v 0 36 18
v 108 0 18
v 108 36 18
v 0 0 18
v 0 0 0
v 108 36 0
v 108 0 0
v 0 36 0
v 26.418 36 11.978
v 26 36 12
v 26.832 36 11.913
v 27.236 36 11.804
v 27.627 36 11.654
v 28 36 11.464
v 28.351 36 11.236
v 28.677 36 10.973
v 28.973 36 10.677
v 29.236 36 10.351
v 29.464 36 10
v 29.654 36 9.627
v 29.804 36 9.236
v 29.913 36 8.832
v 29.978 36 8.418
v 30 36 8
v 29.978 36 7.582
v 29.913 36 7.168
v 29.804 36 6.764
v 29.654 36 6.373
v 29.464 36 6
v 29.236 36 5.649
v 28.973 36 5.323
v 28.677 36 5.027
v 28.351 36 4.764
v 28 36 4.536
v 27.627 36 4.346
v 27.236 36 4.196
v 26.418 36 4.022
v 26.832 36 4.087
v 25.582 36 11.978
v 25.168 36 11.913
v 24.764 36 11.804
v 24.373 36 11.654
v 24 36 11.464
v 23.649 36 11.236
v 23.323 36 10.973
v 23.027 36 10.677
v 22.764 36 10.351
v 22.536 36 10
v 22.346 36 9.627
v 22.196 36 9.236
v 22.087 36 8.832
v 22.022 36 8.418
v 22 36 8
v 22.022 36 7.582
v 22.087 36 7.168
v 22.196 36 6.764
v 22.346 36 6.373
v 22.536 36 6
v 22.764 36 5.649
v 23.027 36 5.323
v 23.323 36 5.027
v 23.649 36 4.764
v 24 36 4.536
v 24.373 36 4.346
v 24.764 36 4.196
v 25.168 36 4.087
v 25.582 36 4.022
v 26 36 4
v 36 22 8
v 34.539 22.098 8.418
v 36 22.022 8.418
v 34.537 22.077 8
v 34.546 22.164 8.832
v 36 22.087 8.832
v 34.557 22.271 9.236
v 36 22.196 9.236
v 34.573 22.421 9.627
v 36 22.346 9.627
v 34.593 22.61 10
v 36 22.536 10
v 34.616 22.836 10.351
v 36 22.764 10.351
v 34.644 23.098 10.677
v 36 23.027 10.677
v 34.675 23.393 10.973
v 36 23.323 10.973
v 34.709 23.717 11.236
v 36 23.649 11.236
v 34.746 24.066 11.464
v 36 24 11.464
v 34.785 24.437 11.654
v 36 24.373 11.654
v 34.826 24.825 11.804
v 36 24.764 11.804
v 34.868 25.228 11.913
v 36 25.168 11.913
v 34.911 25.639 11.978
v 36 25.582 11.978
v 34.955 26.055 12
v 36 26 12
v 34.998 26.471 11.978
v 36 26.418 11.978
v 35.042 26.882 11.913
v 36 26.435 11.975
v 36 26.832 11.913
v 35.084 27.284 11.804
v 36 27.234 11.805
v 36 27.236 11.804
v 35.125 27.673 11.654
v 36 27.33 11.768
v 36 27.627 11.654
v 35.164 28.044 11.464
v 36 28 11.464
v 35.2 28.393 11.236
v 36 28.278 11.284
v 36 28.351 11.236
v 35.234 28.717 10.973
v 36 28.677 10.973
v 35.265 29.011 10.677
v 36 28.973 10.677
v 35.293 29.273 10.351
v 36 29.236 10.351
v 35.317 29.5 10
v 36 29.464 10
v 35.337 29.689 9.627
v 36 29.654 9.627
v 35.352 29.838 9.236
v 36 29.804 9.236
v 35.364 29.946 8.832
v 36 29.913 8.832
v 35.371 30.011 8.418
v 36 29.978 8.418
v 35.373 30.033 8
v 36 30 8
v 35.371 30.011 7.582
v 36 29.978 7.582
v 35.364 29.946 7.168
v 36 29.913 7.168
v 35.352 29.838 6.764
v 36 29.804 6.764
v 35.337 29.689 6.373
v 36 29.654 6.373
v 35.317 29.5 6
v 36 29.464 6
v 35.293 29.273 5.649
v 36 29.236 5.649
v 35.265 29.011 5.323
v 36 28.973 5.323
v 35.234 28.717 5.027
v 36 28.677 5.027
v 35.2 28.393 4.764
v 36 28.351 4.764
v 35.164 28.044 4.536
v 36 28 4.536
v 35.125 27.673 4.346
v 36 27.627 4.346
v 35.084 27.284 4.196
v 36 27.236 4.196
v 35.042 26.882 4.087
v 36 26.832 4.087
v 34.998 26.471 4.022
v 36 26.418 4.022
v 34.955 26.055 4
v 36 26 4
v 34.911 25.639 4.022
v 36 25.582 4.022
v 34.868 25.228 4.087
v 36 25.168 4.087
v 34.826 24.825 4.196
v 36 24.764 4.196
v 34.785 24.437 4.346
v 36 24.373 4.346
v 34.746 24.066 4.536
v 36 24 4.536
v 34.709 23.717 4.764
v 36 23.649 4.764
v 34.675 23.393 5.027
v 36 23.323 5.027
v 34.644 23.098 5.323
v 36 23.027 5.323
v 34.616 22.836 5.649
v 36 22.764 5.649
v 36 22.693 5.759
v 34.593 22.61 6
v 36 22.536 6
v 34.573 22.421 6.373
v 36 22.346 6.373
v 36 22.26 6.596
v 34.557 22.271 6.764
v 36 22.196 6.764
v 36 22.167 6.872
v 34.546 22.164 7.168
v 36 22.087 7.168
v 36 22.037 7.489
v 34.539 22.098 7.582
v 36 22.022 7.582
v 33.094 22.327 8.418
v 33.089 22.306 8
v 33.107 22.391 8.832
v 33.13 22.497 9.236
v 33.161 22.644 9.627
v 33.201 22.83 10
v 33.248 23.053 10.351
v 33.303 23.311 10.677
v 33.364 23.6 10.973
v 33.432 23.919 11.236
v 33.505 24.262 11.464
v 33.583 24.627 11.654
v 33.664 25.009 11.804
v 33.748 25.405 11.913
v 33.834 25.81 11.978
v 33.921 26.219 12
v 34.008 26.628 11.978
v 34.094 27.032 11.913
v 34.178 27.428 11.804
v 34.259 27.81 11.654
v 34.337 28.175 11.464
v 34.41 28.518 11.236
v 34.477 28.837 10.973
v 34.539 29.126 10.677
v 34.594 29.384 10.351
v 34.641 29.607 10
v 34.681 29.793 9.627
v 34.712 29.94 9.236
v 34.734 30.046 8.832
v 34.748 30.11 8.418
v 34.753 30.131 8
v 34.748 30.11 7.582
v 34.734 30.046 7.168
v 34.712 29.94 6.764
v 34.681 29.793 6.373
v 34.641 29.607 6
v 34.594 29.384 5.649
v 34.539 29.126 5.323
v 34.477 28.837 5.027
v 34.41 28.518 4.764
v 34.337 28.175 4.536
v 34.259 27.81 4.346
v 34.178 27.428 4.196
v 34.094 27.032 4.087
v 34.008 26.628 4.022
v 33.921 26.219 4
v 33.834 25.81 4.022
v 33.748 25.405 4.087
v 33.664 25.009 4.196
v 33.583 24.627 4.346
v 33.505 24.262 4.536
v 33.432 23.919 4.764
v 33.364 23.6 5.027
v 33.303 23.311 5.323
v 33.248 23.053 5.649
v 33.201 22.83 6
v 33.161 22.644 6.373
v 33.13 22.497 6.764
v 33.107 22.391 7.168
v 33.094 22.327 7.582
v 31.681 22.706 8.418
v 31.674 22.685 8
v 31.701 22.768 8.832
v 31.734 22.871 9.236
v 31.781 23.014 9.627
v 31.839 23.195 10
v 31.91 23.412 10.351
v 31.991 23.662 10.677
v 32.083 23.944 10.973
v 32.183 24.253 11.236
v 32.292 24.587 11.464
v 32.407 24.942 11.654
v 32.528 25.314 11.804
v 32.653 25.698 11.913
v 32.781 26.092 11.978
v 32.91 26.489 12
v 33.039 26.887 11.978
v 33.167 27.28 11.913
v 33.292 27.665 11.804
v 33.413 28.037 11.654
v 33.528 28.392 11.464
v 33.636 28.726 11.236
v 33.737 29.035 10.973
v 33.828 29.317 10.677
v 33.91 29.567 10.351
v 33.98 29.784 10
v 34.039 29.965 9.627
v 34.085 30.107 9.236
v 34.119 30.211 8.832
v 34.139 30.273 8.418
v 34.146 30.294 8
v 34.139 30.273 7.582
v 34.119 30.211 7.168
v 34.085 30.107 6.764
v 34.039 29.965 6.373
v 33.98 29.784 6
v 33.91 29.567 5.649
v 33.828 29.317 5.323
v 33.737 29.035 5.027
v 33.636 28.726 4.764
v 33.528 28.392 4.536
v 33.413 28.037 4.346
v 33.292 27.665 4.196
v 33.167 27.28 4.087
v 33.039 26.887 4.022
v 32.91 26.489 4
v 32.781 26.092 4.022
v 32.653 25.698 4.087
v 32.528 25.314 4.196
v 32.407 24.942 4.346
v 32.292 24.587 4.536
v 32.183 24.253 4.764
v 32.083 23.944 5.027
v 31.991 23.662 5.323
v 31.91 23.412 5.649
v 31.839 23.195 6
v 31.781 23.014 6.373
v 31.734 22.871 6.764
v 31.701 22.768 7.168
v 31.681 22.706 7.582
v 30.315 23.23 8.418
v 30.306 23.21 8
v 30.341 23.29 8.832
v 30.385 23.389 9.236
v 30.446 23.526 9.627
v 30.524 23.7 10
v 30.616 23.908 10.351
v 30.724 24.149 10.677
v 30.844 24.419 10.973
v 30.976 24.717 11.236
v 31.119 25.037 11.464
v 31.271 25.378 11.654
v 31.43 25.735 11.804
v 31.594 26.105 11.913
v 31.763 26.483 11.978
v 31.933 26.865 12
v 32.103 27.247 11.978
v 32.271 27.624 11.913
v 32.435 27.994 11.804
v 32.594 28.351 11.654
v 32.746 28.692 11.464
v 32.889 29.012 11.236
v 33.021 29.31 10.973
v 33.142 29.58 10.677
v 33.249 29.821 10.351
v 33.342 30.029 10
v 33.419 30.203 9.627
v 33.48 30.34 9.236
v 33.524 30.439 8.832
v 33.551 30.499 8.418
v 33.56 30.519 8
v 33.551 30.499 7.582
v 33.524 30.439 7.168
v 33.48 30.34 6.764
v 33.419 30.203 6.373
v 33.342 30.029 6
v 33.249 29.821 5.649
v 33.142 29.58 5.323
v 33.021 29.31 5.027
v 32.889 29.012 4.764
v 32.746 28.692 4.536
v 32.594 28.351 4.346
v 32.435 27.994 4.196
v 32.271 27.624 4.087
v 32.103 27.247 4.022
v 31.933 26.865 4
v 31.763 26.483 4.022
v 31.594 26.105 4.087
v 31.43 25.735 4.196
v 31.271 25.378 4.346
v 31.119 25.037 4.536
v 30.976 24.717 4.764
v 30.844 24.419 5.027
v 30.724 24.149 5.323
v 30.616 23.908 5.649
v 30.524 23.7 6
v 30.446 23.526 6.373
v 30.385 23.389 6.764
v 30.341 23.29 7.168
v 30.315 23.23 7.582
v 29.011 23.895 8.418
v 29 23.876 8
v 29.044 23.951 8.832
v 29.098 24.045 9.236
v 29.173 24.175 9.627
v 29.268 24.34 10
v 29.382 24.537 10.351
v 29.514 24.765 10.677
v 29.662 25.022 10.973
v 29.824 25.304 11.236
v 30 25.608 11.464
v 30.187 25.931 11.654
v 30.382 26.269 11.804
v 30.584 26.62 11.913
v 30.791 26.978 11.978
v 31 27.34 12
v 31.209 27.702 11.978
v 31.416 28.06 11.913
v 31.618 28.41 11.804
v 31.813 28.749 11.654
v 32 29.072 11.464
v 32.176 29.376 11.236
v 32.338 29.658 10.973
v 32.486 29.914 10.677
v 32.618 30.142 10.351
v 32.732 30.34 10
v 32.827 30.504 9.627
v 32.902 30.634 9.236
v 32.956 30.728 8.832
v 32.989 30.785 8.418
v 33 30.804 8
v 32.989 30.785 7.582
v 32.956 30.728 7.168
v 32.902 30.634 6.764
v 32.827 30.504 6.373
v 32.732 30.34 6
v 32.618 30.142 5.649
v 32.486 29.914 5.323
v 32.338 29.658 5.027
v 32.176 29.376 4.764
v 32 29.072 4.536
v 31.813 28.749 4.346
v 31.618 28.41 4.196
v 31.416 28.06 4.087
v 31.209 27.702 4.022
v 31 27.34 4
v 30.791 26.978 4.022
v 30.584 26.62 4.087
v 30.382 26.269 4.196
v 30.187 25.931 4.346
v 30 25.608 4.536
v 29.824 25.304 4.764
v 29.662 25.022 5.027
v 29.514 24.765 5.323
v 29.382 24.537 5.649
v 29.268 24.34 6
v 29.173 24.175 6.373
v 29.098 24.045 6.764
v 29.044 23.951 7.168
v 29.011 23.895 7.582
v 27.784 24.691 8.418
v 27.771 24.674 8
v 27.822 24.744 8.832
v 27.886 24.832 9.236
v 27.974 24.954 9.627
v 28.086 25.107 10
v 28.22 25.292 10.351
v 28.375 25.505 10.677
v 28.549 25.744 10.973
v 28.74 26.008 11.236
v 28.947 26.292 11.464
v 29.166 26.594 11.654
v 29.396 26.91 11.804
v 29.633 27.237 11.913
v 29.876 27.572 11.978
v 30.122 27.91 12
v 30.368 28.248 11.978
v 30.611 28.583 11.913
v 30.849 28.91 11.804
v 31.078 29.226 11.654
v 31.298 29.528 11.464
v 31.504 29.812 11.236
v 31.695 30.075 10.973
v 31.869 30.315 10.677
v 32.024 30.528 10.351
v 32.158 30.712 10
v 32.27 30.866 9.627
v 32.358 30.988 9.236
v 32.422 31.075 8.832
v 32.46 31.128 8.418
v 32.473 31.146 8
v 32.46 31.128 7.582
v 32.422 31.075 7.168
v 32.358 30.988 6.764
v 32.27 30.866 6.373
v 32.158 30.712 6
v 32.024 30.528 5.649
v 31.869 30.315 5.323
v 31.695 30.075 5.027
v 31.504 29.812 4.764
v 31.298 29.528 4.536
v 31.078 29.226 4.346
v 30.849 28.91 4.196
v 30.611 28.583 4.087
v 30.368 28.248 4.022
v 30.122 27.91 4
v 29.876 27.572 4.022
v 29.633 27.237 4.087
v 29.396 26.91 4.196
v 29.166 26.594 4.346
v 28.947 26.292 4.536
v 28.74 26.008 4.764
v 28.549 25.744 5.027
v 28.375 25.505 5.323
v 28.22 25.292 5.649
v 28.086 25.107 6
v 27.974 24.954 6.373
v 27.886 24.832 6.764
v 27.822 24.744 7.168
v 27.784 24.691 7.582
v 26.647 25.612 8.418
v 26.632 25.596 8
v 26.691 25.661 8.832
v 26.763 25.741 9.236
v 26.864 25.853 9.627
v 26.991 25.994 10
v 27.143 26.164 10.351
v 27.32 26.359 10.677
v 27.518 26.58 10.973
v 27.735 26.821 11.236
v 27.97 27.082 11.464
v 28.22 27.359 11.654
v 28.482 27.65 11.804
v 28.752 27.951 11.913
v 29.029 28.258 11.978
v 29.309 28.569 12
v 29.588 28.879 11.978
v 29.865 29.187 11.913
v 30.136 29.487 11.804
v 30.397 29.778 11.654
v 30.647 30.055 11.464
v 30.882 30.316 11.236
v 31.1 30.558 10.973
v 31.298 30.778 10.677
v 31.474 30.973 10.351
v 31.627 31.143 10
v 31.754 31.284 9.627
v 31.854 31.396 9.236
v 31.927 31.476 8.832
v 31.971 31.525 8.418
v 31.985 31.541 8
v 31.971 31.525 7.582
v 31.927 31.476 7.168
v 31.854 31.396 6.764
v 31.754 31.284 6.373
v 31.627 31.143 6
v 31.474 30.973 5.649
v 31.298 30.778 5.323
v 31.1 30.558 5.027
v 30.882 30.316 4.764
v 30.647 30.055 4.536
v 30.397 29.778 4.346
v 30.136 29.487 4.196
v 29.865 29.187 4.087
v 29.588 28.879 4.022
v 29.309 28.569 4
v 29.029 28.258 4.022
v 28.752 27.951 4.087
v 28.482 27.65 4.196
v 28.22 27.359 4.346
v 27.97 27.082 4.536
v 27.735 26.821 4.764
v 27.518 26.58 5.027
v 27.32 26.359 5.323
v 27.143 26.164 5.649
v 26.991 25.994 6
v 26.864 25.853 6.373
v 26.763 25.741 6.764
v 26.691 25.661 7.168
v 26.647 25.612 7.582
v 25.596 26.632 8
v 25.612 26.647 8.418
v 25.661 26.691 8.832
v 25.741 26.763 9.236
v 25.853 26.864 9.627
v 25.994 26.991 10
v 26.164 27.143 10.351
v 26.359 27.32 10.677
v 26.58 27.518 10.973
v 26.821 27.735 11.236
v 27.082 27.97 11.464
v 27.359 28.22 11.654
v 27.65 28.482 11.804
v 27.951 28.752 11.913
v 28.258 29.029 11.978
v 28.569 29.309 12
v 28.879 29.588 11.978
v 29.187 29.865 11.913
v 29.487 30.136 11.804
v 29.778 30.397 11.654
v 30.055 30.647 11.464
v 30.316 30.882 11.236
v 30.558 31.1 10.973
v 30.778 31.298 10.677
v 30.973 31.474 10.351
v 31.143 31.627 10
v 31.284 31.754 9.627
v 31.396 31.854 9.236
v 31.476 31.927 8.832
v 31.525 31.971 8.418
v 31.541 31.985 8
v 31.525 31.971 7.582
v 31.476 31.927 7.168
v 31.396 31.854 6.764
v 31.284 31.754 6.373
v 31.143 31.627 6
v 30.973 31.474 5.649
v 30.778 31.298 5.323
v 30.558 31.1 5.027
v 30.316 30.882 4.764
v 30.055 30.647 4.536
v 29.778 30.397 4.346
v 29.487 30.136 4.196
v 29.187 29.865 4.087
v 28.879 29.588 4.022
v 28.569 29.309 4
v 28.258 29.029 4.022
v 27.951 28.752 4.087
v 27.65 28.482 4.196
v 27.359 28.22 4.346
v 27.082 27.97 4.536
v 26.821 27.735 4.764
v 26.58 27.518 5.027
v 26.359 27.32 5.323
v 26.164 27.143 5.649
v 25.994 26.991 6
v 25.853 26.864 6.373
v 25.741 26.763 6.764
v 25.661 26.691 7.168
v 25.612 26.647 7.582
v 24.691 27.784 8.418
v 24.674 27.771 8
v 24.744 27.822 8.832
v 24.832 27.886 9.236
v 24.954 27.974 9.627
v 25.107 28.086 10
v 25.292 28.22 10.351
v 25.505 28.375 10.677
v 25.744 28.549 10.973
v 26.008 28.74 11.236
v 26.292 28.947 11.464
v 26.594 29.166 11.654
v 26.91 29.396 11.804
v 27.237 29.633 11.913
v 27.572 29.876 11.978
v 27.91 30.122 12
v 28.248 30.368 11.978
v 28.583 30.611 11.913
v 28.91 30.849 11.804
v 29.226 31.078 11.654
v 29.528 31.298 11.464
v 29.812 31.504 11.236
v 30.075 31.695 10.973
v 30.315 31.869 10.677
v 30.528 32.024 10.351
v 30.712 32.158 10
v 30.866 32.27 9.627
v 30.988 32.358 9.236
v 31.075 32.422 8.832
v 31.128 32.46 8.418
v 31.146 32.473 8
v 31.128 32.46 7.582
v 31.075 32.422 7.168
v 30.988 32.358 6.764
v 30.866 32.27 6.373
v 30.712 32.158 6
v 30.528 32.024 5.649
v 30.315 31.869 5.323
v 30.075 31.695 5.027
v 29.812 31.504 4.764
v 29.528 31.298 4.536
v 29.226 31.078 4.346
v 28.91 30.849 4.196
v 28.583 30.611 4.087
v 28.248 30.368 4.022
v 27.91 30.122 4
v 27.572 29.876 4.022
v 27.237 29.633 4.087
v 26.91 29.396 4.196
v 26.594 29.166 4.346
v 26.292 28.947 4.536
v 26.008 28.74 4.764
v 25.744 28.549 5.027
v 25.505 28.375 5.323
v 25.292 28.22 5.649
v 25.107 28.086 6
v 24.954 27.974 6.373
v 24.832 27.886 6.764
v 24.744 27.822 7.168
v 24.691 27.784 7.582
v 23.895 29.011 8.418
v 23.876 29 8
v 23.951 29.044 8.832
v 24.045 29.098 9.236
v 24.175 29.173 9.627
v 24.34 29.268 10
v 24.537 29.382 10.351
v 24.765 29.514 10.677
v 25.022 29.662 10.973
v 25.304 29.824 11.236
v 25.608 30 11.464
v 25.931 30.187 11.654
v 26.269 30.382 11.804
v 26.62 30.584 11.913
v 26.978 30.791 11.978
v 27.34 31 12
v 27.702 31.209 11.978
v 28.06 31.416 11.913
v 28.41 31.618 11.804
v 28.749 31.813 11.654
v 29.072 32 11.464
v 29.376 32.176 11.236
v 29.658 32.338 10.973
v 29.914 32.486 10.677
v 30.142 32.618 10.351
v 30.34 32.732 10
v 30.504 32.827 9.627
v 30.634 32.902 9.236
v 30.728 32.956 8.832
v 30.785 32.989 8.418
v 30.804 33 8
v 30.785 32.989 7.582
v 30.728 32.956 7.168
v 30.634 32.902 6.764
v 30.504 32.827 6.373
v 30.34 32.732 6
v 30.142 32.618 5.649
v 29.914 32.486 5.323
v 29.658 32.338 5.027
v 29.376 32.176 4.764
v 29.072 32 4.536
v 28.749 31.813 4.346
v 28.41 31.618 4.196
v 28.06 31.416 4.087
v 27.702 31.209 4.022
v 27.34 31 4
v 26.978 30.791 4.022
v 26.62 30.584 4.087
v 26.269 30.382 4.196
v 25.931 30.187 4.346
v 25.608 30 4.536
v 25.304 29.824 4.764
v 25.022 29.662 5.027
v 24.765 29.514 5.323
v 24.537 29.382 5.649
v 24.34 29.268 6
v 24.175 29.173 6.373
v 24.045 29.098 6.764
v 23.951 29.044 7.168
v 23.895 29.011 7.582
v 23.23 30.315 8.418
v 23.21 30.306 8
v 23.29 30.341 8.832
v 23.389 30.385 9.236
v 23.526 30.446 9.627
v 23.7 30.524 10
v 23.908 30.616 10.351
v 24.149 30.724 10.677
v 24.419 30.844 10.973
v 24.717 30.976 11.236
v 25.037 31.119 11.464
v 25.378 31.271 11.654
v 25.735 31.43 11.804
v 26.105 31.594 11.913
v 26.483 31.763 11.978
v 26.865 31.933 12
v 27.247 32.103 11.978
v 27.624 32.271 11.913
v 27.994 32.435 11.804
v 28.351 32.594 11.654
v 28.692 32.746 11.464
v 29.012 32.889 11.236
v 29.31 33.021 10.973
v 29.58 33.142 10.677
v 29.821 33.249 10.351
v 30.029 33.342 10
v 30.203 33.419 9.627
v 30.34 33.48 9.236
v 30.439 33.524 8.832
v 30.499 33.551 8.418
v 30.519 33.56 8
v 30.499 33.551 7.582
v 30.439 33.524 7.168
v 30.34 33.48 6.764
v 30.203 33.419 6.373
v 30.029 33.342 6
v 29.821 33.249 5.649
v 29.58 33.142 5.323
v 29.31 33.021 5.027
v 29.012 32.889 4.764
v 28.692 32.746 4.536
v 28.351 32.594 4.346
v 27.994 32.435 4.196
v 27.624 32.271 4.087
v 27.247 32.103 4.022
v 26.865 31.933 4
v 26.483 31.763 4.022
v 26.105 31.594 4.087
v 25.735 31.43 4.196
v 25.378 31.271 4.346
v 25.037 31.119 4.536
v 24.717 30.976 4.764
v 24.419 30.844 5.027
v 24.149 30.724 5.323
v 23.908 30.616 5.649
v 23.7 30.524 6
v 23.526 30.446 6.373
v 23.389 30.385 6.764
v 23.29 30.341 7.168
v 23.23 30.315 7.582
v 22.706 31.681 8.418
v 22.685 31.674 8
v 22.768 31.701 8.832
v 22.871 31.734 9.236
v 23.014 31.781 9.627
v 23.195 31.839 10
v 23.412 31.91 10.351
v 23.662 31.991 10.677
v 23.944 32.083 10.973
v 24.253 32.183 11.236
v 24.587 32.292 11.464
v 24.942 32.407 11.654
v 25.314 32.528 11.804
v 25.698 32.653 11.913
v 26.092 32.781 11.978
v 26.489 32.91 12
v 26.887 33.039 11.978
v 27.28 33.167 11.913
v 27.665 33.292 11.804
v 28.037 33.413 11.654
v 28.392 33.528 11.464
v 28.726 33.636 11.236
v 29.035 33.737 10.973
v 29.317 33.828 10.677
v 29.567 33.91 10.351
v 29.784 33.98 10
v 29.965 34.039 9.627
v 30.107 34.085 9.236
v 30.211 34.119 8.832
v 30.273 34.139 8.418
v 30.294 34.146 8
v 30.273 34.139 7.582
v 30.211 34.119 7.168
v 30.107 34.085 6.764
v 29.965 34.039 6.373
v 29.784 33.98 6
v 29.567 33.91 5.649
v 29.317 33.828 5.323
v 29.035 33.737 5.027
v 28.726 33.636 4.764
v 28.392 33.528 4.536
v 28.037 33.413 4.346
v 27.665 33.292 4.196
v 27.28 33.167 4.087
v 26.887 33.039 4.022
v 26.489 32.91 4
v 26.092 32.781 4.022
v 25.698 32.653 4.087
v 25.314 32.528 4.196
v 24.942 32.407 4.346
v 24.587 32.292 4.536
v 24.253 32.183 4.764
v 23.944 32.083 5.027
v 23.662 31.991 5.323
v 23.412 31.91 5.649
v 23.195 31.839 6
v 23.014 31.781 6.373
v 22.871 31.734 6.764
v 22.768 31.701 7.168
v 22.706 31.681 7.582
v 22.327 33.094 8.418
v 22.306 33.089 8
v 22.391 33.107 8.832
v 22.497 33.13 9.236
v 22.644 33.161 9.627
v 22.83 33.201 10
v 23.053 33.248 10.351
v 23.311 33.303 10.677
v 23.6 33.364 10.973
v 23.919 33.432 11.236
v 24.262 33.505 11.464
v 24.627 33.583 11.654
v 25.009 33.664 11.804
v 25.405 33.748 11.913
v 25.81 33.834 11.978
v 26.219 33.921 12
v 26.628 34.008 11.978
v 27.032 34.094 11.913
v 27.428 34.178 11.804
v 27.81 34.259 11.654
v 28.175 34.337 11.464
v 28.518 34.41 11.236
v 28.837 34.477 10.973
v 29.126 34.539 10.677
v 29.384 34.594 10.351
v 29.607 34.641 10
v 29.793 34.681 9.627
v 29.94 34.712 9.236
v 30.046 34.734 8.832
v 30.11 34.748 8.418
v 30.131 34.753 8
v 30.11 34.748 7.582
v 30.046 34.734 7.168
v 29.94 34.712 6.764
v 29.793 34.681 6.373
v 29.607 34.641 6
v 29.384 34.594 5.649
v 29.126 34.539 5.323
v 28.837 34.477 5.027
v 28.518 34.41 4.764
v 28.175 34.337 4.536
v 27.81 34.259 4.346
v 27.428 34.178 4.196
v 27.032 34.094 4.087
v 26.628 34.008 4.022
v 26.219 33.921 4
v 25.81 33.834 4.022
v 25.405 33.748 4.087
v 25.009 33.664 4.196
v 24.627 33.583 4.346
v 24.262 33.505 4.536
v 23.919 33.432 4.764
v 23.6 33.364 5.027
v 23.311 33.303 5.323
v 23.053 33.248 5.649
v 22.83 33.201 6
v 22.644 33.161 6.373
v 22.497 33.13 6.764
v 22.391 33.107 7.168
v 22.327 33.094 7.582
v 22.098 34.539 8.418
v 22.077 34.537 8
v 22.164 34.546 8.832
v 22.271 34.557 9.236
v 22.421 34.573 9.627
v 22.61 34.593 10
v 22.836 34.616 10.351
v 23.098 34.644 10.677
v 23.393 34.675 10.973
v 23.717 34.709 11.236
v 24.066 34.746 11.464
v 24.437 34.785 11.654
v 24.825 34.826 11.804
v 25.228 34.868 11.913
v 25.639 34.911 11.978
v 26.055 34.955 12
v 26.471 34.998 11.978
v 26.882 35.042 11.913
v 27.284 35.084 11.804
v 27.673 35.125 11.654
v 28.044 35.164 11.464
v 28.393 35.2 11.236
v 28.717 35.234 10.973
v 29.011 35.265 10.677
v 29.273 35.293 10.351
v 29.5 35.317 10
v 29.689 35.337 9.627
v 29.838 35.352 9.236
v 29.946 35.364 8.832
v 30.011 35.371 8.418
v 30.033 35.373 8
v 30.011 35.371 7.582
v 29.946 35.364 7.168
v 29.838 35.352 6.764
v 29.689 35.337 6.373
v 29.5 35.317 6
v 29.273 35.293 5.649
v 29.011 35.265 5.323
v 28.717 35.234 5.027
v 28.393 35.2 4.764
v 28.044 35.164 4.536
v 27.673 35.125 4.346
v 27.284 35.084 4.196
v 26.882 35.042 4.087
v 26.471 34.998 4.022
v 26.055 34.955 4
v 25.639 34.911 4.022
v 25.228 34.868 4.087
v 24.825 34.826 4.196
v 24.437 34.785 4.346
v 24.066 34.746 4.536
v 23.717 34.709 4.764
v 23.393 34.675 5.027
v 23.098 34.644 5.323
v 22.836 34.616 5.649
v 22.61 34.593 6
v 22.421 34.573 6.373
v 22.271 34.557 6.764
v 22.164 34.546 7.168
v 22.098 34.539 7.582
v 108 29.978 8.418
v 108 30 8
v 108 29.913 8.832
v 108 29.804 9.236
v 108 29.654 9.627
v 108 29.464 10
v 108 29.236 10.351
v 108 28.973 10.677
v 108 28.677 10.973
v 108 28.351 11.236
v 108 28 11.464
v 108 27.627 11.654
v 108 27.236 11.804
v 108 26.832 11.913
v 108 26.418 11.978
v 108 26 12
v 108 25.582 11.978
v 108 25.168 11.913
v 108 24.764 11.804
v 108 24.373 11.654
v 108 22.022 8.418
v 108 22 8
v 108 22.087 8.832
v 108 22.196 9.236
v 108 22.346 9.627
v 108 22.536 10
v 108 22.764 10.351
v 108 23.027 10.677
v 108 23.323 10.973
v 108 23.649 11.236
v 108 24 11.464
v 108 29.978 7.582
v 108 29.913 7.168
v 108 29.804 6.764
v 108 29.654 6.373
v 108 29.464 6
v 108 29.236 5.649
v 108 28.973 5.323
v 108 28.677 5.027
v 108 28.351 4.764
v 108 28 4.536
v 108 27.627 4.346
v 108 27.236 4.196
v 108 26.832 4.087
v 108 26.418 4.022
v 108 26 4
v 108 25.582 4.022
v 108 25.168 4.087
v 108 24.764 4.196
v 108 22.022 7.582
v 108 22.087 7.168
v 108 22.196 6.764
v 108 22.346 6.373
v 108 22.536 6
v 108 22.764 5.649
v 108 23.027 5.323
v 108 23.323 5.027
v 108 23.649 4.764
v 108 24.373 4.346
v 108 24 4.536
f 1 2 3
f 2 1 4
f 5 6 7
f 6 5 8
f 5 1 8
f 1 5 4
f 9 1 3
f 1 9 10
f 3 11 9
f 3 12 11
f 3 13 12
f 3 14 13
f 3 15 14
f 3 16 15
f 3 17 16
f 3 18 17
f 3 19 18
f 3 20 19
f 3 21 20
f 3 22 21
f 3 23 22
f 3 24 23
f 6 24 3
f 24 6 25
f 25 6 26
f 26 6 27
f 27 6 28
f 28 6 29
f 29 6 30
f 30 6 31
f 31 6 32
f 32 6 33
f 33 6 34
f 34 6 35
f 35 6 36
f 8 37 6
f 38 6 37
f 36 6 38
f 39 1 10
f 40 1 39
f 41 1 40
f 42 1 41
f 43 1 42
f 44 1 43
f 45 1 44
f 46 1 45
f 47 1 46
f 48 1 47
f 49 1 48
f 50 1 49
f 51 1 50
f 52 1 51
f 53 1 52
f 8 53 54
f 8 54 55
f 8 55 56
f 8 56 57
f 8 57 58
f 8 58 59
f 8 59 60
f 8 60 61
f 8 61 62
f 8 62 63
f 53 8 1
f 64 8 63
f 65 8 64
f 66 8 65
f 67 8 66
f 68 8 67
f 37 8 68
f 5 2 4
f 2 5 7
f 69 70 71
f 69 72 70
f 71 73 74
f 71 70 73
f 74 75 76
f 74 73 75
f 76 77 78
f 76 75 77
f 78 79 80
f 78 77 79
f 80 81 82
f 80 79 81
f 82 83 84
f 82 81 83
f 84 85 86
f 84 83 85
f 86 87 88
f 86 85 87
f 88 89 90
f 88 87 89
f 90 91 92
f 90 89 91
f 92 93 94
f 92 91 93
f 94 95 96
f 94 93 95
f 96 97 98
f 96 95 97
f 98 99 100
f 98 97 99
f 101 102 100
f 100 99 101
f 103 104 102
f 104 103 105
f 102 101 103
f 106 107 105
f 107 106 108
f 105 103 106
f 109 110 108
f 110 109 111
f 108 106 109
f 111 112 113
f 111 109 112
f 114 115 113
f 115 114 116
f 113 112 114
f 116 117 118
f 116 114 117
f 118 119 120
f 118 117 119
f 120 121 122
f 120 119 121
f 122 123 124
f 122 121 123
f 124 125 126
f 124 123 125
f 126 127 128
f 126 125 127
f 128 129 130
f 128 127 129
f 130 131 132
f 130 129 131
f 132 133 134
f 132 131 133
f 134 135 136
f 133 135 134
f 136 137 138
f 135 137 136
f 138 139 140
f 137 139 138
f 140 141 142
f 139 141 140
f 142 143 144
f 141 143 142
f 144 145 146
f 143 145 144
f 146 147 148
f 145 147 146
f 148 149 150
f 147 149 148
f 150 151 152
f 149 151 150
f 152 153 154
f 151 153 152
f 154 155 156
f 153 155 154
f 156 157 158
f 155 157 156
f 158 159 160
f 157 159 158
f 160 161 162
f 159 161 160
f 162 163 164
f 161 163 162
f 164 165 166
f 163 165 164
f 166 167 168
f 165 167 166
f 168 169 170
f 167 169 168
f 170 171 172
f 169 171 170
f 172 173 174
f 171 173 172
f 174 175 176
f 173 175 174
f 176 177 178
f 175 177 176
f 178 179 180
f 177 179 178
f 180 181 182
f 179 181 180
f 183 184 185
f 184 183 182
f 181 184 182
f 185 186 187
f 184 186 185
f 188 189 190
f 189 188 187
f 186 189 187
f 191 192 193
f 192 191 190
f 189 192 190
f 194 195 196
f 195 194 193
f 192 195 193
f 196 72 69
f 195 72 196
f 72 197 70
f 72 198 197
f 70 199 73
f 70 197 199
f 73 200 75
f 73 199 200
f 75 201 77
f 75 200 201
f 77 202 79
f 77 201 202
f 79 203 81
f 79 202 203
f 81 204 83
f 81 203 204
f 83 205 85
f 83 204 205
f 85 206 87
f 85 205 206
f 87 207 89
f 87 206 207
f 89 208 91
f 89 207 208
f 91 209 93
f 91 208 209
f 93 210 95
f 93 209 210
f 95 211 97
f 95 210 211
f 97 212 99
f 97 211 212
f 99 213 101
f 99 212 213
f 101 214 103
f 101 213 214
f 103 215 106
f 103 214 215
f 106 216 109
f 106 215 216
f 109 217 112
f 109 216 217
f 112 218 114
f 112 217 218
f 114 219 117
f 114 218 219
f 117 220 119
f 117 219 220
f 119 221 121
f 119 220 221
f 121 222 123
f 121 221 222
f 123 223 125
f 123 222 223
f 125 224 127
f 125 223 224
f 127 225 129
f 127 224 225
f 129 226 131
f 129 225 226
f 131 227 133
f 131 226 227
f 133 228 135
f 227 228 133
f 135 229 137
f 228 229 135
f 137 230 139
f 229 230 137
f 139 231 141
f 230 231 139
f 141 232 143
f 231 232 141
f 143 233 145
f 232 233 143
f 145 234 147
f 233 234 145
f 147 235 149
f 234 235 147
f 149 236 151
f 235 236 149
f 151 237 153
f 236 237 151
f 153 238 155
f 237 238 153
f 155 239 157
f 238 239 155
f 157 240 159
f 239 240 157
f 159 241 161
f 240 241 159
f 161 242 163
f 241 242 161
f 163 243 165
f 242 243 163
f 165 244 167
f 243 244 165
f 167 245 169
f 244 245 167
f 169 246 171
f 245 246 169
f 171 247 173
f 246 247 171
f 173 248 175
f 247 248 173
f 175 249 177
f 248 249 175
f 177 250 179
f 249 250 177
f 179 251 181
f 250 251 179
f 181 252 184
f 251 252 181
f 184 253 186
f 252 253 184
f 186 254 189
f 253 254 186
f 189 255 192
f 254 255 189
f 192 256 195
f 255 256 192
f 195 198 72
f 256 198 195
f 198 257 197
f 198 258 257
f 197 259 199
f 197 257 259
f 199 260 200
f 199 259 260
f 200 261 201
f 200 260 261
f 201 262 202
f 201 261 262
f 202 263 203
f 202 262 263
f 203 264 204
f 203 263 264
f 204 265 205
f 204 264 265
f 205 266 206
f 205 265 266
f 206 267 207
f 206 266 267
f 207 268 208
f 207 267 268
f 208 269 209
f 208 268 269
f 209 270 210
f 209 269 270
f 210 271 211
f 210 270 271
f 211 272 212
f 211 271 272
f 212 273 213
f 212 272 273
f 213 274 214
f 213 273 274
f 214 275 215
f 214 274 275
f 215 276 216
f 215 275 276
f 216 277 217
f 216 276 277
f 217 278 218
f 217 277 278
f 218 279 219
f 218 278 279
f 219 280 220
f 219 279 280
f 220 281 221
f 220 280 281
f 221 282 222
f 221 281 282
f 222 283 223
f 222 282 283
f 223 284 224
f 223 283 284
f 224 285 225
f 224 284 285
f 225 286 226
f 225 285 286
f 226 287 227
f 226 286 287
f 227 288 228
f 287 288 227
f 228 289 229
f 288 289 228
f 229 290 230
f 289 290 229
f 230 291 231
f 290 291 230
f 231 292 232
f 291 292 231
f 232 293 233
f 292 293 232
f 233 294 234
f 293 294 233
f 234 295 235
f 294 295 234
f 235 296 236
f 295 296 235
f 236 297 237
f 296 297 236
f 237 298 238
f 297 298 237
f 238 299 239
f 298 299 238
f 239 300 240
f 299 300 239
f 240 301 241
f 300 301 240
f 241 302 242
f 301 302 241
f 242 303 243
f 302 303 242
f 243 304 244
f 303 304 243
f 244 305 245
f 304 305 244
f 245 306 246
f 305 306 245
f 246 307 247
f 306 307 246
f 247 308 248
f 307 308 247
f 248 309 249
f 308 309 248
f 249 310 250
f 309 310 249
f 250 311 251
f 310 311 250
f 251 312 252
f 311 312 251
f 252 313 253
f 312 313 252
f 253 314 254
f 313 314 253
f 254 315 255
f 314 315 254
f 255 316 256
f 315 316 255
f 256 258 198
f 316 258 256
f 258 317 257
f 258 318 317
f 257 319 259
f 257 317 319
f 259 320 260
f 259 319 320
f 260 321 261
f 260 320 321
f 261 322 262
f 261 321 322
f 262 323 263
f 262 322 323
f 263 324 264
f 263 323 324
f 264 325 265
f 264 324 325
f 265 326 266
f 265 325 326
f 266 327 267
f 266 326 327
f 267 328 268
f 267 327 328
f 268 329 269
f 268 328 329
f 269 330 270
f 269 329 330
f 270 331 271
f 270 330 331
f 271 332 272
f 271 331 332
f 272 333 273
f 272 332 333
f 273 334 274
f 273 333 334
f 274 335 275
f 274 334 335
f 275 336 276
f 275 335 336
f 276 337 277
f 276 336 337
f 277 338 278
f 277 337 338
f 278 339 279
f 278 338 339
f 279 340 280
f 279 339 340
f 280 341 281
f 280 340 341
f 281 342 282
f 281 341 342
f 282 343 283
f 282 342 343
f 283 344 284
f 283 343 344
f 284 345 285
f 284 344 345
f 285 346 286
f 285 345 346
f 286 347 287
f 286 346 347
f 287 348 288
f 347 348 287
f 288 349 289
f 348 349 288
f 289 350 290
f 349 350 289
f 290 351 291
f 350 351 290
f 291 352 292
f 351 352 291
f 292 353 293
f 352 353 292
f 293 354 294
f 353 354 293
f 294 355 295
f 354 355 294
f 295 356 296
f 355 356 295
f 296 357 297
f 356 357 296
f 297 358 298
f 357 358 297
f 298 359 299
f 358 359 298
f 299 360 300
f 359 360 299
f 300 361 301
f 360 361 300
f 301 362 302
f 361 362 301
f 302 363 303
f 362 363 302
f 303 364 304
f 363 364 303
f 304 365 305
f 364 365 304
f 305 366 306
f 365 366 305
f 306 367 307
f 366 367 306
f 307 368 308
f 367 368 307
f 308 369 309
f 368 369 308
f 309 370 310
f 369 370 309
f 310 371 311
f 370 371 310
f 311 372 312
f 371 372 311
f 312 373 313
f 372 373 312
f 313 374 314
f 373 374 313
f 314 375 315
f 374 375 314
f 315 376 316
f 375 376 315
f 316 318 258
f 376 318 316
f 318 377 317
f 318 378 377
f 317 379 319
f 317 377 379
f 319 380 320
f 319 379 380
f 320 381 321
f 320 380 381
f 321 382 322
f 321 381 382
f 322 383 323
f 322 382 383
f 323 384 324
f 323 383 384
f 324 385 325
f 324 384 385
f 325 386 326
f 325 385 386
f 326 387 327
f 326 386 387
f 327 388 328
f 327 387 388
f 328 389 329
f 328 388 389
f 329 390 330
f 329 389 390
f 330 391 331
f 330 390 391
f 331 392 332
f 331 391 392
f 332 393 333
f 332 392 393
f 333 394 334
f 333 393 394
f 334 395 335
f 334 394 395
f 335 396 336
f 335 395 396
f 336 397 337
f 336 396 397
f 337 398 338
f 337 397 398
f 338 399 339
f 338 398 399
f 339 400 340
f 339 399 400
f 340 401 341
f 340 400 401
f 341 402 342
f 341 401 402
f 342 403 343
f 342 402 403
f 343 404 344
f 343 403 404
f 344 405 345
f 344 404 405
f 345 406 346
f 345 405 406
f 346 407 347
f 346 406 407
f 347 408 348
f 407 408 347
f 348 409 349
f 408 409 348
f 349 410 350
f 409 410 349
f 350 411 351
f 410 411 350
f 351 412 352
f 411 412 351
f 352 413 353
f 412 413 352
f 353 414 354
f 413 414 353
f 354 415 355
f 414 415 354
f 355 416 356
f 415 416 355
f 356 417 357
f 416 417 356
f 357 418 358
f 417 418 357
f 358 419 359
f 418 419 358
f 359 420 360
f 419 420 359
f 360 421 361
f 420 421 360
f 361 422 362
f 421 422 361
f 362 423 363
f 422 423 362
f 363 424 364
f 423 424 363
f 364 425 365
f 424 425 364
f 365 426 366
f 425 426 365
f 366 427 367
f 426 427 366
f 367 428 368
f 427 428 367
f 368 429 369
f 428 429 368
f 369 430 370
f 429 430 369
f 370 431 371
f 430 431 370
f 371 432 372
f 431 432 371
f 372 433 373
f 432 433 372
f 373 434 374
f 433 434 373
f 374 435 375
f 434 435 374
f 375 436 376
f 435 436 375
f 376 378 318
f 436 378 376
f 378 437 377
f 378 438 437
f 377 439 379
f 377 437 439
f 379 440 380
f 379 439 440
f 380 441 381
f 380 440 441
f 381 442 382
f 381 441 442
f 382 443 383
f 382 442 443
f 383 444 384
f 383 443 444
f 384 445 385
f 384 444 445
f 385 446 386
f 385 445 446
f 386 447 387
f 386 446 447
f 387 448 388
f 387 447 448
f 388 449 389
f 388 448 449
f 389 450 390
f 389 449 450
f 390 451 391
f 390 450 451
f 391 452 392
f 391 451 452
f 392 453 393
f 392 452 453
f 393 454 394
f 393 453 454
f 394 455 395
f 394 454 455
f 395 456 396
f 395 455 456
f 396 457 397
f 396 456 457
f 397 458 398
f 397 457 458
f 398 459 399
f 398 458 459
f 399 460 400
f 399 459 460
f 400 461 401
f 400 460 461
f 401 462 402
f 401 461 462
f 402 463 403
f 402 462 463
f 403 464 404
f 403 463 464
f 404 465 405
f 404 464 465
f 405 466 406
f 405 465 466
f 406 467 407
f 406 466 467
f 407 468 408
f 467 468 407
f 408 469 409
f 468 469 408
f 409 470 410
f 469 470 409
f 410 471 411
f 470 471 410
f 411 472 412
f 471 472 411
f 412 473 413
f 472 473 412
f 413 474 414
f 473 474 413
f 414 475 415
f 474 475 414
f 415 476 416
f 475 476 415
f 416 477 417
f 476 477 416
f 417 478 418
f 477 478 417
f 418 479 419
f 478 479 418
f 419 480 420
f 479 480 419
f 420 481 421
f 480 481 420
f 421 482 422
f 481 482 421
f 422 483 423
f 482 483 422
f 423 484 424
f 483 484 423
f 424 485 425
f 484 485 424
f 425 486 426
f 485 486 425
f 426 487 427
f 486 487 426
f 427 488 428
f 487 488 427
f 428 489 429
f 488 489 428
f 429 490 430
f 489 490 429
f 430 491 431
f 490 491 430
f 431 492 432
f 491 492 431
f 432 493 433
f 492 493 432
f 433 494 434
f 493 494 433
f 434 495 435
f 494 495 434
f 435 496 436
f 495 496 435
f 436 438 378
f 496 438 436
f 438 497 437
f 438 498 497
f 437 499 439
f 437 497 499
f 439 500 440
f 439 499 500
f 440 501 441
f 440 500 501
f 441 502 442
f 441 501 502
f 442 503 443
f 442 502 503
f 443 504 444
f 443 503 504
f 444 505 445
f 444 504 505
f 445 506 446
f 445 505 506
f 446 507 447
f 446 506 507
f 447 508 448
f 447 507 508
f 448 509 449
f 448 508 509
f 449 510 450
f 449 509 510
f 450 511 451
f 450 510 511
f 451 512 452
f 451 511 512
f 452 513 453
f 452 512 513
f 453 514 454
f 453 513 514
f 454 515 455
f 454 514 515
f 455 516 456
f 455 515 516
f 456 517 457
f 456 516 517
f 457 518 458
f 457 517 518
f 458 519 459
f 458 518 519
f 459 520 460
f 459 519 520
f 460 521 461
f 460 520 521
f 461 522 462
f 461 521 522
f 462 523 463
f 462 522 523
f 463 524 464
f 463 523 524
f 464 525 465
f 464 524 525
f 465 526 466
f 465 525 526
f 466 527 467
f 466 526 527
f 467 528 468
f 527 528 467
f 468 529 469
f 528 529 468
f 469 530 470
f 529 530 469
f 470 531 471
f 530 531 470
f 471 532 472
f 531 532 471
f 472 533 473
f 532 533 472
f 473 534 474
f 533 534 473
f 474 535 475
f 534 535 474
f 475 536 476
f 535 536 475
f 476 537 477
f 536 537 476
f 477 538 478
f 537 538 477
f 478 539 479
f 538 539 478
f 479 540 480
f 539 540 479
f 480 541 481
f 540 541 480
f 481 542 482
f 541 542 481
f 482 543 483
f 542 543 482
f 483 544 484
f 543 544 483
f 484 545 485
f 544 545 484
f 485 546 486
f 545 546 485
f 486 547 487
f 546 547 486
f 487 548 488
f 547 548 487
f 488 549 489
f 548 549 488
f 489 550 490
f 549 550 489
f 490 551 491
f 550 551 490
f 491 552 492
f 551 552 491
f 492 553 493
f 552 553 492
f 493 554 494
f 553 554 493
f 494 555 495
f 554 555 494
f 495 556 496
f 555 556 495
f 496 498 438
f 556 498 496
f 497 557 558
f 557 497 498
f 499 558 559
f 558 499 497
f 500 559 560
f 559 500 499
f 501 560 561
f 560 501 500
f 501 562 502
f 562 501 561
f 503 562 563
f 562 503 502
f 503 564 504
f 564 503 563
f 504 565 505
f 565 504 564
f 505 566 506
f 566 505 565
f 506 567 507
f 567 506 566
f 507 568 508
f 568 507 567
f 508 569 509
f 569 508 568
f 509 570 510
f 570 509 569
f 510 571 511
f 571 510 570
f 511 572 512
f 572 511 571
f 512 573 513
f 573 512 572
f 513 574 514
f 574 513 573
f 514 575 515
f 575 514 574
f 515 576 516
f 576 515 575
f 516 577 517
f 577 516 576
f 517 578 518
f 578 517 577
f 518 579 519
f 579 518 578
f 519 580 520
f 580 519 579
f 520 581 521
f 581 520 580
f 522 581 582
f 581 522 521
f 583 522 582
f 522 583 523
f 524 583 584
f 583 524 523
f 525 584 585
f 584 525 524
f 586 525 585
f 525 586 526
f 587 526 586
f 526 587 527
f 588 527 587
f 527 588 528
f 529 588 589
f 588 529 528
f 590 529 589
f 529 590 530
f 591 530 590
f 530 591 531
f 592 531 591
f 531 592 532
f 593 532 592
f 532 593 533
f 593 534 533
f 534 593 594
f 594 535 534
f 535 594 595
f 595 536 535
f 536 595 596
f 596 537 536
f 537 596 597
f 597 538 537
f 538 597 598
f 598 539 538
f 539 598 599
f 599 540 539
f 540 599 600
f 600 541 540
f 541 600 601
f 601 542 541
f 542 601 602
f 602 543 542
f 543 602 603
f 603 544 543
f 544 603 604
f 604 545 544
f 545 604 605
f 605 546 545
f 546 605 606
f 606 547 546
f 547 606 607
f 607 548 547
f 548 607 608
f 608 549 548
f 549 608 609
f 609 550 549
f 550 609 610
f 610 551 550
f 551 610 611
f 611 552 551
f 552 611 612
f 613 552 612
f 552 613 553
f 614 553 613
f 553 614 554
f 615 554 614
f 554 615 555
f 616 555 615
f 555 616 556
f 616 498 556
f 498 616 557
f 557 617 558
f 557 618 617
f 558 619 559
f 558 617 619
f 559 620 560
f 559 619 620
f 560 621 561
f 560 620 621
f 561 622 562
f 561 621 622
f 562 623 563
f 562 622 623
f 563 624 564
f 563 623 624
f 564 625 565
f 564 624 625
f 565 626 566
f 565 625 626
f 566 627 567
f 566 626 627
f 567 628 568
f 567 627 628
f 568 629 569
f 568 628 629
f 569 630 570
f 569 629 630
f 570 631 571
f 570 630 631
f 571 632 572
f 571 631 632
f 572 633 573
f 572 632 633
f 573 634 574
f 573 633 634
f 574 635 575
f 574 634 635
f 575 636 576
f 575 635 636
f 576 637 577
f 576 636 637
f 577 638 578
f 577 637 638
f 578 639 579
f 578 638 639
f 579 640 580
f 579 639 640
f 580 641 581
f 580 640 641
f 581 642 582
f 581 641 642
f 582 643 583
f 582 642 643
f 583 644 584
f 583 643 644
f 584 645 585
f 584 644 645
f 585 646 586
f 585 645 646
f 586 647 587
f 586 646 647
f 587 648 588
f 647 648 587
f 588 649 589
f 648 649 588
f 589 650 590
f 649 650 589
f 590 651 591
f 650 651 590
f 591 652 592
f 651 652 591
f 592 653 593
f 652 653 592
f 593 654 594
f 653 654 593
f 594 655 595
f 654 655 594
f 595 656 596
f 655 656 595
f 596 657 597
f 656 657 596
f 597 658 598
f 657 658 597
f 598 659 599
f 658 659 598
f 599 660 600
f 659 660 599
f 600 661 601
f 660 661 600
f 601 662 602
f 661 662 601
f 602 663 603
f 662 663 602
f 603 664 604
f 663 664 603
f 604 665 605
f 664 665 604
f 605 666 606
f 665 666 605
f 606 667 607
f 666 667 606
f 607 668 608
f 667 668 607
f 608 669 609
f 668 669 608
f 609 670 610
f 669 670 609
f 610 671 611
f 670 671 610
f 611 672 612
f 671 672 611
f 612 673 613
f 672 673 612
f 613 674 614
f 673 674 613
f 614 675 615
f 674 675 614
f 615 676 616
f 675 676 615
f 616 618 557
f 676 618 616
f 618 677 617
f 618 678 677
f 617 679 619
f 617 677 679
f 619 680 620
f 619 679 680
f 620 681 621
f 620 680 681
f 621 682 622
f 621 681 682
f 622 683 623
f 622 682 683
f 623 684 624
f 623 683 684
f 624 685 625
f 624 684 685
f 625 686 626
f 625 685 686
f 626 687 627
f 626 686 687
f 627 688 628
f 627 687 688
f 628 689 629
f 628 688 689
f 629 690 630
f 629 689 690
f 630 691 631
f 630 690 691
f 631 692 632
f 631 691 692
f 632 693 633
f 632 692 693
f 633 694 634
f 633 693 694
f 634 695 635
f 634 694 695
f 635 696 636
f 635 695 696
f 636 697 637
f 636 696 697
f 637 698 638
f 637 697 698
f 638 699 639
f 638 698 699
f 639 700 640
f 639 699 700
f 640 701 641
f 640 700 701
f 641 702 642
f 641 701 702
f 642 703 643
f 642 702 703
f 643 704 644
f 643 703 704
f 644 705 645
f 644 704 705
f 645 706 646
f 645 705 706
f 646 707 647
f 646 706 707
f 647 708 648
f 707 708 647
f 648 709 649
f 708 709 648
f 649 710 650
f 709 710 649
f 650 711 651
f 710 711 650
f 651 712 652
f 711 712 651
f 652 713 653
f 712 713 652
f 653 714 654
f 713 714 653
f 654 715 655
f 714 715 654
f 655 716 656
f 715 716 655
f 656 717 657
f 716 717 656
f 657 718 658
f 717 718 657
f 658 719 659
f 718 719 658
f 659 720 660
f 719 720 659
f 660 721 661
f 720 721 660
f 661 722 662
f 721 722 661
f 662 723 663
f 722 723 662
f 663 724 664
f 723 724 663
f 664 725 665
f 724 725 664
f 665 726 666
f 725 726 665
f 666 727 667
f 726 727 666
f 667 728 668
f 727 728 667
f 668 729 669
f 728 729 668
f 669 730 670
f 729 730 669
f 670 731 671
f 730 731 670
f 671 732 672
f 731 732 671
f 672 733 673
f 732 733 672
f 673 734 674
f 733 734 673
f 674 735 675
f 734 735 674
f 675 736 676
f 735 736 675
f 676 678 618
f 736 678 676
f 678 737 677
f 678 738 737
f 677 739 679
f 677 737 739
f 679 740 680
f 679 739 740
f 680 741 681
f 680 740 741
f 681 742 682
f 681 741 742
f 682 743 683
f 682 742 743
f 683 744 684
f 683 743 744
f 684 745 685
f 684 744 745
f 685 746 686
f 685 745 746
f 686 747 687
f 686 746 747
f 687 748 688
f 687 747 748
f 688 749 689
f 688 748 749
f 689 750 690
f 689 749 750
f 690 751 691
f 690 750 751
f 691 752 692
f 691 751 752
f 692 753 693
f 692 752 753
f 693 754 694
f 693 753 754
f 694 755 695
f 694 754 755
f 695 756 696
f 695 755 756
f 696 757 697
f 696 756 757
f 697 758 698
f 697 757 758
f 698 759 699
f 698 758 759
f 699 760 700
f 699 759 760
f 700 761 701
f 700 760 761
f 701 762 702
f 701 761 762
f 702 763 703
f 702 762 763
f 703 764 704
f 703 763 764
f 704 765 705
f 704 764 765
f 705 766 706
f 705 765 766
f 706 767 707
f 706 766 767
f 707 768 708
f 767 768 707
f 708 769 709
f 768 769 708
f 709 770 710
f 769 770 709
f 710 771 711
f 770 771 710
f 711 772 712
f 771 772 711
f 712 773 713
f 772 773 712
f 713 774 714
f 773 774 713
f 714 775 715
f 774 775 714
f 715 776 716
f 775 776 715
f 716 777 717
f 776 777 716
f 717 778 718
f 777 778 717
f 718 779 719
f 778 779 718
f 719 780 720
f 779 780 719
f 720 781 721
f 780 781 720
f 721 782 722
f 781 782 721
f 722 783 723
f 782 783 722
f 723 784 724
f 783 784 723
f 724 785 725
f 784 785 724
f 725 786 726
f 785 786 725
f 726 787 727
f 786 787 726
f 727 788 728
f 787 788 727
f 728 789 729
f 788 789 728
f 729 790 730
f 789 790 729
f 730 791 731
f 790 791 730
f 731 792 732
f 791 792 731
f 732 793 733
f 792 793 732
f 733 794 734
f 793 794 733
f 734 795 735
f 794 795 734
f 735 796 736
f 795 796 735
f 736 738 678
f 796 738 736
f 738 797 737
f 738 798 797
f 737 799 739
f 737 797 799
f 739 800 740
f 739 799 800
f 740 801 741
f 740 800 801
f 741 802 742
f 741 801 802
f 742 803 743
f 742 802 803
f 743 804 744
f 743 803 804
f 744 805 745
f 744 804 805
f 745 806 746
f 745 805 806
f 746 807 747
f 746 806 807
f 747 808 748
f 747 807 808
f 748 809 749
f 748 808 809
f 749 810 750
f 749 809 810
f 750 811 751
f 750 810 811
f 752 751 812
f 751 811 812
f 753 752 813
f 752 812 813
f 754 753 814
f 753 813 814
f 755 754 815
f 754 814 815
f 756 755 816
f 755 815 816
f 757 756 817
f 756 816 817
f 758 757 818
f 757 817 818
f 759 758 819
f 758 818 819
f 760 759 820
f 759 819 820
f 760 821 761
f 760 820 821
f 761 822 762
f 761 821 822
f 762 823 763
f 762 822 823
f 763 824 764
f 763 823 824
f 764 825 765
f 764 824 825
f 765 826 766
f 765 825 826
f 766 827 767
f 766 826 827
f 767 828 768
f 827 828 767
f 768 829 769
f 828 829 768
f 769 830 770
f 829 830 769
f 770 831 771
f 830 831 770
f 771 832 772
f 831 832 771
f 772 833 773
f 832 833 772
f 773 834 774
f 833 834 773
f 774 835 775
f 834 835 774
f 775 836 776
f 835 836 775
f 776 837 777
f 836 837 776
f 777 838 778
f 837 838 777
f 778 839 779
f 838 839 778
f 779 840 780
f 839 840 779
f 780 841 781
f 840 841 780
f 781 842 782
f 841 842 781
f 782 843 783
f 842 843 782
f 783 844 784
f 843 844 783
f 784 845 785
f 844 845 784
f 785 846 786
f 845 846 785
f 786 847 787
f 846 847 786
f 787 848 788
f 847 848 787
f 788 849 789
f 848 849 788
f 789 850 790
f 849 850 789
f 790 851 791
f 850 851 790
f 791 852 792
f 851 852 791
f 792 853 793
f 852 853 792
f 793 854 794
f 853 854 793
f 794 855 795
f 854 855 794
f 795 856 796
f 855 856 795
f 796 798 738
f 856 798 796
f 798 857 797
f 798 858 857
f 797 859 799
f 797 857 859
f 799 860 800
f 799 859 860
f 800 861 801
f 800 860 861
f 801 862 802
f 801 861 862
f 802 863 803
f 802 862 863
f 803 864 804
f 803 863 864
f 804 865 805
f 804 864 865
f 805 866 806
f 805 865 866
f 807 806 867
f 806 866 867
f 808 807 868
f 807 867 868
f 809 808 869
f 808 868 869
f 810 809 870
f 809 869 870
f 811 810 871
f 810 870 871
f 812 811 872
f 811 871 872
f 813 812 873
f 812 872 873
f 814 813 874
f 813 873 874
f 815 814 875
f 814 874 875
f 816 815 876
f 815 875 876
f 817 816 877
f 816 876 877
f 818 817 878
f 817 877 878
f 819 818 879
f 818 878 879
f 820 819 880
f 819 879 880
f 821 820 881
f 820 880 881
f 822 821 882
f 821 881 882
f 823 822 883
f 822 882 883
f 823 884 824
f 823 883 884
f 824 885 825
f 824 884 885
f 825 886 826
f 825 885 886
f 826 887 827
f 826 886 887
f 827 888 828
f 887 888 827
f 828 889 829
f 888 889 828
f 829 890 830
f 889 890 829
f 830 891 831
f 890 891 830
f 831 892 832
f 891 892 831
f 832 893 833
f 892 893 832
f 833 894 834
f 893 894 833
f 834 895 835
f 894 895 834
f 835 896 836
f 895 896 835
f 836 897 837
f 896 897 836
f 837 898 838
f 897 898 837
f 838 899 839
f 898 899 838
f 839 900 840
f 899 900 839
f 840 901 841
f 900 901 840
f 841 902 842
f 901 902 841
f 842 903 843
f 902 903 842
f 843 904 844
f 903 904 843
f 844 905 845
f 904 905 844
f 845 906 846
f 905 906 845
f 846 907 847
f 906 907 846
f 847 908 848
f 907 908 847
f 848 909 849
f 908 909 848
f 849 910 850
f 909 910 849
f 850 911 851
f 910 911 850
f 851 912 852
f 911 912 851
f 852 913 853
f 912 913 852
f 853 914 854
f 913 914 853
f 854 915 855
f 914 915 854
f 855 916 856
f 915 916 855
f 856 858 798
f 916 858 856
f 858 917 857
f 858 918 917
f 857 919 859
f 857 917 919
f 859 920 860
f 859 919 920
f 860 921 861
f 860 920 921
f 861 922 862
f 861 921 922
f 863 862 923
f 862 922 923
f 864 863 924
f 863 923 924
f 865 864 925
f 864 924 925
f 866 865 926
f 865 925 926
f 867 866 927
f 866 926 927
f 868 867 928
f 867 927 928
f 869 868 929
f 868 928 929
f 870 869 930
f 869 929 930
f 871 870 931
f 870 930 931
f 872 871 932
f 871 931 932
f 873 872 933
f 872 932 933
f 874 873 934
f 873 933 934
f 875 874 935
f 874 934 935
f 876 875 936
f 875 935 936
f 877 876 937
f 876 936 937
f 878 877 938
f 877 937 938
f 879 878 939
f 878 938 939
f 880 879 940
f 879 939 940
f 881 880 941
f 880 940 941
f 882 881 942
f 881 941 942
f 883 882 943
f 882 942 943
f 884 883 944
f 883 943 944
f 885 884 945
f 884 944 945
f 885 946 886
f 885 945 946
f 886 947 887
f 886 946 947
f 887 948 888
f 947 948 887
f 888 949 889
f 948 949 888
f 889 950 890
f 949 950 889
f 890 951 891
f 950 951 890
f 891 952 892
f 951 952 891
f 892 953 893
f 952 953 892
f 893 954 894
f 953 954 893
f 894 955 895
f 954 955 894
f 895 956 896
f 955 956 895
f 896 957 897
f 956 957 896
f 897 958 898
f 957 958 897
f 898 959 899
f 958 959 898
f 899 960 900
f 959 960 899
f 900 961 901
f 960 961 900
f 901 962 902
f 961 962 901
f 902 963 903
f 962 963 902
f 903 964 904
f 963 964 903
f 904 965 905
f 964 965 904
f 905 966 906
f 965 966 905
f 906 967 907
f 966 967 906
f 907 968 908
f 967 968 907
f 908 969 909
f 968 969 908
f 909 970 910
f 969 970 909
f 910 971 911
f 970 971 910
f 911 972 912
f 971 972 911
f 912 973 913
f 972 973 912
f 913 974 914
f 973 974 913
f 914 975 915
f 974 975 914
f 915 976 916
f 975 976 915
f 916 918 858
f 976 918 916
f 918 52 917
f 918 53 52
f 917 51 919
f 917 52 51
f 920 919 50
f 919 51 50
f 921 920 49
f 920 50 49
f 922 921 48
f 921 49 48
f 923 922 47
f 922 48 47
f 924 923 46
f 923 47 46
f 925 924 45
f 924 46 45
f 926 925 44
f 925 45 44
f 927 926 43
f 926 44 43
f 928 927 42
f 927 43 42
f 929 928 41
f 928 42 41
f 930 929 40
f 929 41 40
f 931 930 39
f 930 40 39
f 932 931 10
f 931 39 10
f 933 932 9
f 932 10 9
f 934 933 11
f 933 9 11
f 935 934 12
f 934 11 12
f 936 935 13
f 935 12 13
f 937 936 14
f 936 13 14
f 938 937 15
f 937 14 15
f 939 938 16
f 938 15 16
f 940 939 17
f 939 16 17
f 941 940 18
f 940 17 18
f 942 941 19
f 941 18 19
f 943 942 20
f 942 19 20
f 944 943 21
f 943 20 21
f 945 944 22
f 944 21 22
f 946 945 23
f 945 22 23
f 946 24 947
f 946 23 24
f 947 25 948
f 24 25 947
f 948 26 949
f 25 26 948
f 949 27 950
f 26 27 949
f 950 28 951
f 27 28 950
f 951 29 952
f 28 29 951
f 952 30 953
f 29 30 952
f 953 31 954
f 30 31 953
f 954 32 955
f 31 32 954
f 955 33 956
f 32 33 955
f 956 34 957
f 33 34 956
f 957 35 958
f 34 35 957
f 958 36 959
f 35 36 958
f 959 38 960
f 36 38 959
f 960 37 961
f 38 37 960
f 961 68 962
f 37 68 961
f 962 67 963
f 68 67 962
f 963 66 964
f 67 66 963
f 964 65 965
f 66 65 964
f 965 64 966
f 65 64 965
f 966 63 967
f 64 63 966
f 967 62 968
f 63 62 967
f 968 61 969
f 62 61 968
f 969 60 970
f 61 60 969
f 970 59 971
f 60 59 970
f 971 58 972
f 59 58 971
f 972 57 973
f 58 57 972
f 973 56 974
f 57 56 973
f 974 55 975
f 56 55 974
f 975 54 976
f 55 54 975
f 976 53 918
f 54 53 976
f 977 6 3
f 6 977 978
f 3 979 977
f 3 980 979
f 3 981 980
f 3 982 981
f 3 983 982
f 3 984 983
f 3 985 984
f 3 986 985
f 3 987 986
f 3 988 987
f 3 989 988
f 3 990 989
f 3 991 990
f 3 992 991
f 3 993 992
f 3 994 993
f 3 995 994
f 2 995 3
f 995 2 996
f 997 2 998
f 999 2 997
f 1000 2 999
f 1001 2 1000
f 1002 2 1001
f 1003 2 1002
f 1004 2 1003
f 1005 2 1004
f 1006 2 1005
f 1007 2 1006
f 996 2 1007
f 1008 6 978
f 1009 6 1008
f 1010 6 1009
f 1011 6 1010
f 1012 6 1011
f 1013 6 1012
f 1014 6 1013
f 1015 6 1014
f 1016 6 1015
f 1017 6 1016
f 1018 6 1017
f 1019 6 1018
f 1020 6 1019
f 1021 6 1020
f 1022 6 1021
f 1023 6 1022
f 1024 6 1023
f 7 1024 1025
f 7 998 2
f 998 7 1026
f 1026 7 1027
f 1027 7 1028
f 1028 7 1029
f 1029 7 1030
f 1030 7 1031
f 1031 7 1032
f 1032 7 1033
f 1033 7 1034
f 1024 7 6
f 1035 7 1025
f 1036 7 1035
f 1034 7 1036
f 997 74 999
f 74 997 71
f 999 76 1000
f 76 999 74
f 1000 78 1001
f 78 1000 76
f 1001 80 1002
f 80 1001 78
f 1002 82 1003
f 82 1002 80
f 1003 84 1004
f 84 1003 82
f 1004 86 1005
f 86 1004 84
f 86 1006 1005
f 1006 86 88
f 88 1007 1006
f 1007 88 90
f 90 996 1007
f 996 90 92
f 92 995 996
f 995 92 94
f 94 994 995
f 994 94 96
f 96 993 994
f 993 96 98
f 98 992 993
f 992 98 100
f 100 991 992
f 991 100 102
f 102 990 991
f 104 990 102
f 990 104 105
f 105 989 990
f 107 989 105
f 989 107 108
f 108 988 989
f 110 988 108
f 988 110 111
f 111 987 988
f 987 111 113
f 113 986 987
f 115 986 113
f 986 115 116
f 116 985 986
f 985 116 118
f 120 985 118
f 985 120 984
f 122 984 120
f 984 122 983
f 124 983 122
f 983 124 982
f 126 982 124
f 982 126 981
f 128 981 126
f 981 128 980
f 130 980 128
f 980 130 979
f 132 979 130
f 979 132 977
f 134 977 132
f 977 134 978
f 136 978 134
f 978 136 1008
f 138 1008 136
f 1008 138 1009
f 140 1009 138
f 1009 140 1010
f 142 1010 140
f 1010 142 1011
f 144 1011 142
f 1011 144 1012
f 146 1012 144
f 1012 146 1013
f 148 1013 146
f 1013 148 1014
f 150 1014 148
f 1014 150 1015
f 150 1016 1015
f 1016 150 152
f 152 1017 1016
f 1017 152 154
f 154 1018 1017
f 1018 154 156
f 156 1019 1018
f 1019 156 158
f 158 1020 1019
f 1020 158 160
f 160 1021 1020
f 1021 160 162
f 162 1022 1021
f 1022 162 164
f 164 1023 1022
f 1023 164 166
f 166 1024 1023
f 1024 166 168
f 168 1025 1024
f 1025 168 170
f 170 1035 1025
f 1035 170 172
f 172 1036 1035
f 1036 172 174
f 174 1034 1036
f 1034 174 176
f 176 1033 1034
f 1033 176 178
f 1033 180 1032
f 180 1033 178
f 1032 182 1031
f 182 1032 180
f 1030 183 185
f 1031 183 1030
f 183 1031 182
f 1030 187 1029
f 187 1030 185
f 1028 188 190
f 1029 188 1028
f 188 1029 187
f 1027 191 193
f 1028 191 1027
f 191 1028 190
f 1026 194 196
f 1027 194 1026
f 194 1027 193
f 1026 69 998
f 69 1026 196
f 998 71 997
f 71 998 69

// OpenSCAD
// All measurements in inches.

red = [1, 0, 0];

// An 8" system can probably put out something like 300 kBTU with the duration
// of burn we want.  That's in the ballpark of our heating load.
FLUE_DIAMETER = 8;
FLUE_RADIUS = FLUE_DIAMETER / 2;

// The recommended minimum amount of masonry covering the flue for a
// comfortable seat.  We may want to go deeper.
FLUE_DEPTH = 6;


// These are comfortable couch dimensions.
BENCH_WIDTH = 36;
BENCH_HEIGHT = 18;
BACKREST_HEIGHT = 36;

// This fits the space well.
BENCH_LENGTH = 72;

color(red) {
    // The northeast corner block.
    difference() {
        cube([36, 36, BENCH_HEIGHT]);

        translate([36, 36, BENCH_HEIGHT - FLUE_RADIUS - FLUE_DEPTH])
          rotate_extrude(convexity=10, $fn=60)
            translate([FLUE_DEPTH + FLUE_RADIUS, 0, 0])
                circle(r=FLUE_RADIUS, $fn=60);
    };

    //
    // The long segment south of the northeast corner.
    //

    // extrusion is limited to making tall things so we have to rotate and
    // translate the result to get it into the right place afterwards.  The
    // rotation takes the tall thing and flops it down but it ends up below the
    // flow.  So the translate both moves it to the position to the north of
    // the northeast corner *and* drags it back up so its sits on the floor.
    translate([36, 0, BENCH_HEIGHT])
      rotate(90, [0, 1, 0])
        linear_extrude(height=BENCH_LENGTH) {
            difference() {
                square(size=[BENCH_HEIGHT, BENCH_WIDTH]);

		// We're in a weird coordinate space (mostly because of
		// limitations of extrude_linear I think).  Push the flue into
		// the mass with x and y (instead of z and y as I would have
		// thought).  Remember, the extrusion polygon is being rendered
		// as a tall thing not a long thing.
                translate([
		    // Push it in so it is FLUE_DEPTH away from the bench
		    //surface.  Recall we're going *down* from the surface of
		    //the bench here.
                    FLUE_RADIUS + FLUE_DEPTH,
		    // Push it in so it is FLUE_DEPTH away from the inner
		    //edge.  This value is pushing *away* from the outer edge.
                    BENCH_WIDTH - FLUE_RADIUS - FLUE_DEPTH,
                   0,
                ])
                    circle(r=FLUE_RADIUS, $fn=60);
            };
        };
};
